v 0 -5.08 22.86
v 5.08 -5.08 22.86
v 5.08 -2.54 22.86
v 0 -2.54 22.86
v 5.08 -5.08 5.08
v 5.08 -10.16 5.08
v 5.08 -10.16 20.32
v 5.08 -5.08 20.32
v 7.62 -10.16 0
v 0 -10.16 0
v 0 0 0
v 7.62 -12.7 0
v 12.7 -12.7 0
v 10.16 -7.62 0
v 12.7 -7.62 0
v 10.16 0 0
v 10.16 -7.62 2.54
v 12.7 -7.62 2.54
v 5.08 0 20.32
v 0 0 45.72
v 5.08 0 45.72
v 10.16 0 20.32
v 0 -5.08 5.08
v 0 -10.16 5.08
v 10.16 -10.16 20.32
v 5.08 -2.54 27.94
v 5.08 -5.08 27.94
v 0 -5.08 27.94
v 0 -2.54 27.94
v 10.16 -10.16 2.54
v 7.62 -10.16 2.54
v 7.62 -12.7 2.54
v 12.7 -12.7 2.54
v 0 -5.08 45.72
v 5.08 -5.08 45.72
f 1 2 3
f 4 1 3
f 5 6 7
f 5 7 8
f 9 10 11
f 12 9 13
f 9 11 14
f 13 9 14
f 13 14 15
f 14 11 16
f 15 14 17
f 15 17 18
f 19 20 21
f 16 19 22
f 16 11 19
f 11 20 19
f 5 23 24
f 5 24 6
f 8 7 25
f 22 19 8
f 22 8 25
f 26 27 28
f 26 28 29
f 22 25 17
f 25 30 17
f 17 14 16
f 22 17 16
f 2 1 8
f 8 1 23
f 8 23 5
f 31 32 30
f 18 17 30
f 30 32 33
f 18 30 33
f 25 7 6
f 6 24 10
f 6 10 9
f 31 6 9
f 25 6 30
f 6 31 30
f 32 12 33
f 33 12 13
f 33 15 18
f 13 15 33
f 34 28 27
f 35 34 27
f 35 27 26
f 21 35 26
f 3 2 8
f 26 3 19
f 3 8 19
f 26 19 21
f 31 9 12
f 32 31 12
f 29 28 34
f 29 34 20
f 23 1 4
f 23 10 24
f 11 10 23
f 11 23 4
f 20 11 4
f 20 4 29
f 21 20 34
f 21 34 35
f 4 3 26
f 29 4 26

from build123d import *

# Parameters (mm, degrees)
F0_W     = 10.16
F0_H     = 10.16
F1_DEPTH = 5.08
F2_W     = 5.08
F2_H     = 5.08
F3_DEPTH = 2.54
F4_W     = 5.08
F4_H     = 5.08
F5_DEPTH = 40.64
F6_W     = 5.08
F6_H     = 5.08
F7_DEPTH = 25.4
F8_W     = 5.08
F8_H     = 10.16
F9_DEPTH = 15.24


with BuildPart() as f1:
    # F0 (on Top) → F1 (new body)
    with BuildSketch(Plane.XY):
        with Locations((5.08, -5.08)):
            Rectangle(F0_W, F0_H)
    extrude(amount=F1_DEPTH)

    # F2 (on face) → F3 (join)
    with BuildSketch(Plane(origin=(0, 0, 0), x_dir=(1, 0, 0), z_dir=(0, 0, -1))):
        with Locations((10.16, 10.16)):
            Rectangle(F2_W, F2_H)
    extrude(amount=-F3_DEPTH)

    # F4 (on face) → F5 (join)
    with BuildSketch(Plane.XY.offset(5.08)):
        with Locations((2.54, -2.54)):
            Rectangle(F4_W, F4_H)
    extrude(amount=F5_DEPTH)

    # F6 (on face) → F7 (cut)
    with BuildSketch(Plane.YZ.offset(5.08)):
        with Locations((-5.08, 25.4)):
            Rectangle(F6_W, F6_H)
    extrude(amount=-F7_DEPTH, mode=Mode.SUBTRACT)

    # F8 (on face) → F9 (join)
    with BuildSketch(Plane.XY.offset(5.08)):
        with Locations((7.62, -5.08)):
            Rectangle(F8_W, F8_H)
    extrude(amount=F9_DEPTH)


solid = f1.part
